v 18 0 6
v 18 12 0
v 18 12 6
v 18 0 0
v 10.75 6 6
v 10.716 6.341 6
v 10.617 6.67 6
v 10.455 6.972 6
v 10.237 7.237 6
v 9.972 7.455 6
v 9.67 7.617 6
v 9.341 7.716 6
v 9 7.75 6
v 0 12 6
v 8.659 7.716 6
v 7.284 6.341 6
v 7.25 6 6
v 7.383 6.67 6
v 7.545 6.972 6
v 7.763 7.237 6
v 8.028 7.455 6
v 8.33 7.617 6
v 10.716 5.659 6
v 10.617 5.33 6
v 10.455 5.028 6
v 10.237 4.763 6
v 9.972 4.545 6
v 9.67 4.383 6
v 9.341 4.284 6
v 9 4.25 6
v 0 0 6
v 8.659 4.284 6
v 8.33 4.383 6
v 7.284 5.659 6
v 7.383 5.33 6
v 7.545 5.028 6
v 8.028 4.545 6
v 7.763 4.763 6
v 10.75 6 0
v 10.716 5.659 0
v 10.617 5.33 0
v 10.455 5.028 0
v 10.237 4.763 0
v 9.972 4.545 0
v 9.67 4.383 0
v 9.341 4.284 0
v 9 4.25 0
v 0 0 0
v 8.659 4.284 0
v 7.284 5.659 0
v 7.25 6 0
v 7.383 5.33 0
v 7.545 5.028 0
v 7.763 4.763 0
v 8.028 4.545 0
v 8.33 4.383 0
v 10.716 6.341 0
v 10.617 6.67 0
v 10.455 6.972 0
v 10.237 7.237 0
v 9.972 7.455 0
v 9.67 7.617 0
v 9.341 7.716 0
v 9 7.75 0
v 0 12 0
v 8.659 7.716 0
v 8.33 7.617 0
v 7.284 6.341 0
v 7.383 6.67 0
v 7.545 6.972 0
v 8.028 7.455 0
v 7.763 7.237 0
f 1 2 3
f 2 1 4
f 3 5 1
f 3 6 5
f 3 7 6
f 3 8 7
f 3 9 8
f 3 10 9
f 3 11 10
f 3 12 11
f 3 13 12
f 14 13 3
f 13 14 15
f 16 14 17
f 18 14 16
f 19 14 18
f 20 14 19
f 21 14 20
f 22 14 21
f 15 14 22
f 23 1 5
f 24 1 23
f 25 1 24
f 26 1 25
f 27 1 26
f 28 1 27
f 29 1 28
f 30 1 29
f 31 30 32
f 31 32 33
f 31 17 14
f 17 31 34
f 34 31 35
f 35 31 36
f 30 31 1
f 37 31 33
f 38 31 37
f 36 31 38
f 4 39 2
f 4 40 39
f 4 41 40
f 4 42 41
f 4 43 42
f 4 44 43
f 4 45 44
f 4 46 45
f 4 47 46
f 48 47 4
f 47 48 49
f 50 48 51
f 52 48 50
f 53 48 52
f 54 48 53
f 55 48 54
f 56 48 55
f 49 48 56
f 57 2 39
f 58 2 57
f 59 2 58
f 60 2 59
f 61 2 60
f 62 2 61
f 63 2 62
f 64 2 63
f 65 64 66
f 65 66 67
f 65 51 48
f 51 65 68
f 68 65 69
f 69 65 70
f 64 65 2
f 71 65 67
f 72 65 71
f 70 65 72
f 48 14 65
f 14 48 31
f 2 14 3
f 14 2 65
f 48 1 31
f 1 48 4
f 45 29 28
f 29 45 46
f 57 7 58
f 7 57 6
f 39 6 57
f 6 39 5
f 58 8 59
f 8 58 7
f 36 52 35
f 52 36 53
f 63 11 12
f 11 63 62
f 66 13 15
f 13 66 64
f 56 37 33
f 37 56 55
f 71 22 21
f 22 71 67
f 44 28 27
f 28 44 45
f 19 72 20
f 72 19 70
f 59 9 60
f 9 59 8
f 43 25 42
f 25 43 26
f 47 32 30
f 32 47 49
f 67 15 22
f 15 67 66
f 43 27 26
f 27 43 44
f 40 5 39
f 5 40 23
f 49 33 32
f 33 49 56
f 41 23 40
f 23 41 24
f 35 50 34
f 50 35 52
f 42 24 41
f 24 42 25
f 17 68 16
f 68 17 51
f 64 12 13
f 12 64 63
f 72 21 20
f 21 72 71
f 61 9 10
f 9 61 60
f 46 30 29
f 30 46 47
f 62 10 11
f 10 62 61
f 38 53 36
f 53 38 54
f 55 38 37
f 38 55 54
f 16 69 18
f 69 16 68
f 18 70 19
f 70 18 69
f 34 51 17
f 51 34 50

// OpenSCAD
$fn = 32;

// ----------------------------------------------------------------------
// Micro pad: drilled pad, 5-20 mm class
// ----------------------------------------------------------------------

// --- parameters (mm) ---
pad_l = 18;               // pad length, X
pad_w = 12;               // pad width, Y
pad_t = 6;                // pad thickness, Z
hole_d = 3.5;             // through hole diameter

difference() {
  cube([pad_l, pad_w, pad_t]);
  translate([pad_l / 2, pad_w / 2, -1])
    cylinder(h = pad_t + 2, d = hole_d);
}
